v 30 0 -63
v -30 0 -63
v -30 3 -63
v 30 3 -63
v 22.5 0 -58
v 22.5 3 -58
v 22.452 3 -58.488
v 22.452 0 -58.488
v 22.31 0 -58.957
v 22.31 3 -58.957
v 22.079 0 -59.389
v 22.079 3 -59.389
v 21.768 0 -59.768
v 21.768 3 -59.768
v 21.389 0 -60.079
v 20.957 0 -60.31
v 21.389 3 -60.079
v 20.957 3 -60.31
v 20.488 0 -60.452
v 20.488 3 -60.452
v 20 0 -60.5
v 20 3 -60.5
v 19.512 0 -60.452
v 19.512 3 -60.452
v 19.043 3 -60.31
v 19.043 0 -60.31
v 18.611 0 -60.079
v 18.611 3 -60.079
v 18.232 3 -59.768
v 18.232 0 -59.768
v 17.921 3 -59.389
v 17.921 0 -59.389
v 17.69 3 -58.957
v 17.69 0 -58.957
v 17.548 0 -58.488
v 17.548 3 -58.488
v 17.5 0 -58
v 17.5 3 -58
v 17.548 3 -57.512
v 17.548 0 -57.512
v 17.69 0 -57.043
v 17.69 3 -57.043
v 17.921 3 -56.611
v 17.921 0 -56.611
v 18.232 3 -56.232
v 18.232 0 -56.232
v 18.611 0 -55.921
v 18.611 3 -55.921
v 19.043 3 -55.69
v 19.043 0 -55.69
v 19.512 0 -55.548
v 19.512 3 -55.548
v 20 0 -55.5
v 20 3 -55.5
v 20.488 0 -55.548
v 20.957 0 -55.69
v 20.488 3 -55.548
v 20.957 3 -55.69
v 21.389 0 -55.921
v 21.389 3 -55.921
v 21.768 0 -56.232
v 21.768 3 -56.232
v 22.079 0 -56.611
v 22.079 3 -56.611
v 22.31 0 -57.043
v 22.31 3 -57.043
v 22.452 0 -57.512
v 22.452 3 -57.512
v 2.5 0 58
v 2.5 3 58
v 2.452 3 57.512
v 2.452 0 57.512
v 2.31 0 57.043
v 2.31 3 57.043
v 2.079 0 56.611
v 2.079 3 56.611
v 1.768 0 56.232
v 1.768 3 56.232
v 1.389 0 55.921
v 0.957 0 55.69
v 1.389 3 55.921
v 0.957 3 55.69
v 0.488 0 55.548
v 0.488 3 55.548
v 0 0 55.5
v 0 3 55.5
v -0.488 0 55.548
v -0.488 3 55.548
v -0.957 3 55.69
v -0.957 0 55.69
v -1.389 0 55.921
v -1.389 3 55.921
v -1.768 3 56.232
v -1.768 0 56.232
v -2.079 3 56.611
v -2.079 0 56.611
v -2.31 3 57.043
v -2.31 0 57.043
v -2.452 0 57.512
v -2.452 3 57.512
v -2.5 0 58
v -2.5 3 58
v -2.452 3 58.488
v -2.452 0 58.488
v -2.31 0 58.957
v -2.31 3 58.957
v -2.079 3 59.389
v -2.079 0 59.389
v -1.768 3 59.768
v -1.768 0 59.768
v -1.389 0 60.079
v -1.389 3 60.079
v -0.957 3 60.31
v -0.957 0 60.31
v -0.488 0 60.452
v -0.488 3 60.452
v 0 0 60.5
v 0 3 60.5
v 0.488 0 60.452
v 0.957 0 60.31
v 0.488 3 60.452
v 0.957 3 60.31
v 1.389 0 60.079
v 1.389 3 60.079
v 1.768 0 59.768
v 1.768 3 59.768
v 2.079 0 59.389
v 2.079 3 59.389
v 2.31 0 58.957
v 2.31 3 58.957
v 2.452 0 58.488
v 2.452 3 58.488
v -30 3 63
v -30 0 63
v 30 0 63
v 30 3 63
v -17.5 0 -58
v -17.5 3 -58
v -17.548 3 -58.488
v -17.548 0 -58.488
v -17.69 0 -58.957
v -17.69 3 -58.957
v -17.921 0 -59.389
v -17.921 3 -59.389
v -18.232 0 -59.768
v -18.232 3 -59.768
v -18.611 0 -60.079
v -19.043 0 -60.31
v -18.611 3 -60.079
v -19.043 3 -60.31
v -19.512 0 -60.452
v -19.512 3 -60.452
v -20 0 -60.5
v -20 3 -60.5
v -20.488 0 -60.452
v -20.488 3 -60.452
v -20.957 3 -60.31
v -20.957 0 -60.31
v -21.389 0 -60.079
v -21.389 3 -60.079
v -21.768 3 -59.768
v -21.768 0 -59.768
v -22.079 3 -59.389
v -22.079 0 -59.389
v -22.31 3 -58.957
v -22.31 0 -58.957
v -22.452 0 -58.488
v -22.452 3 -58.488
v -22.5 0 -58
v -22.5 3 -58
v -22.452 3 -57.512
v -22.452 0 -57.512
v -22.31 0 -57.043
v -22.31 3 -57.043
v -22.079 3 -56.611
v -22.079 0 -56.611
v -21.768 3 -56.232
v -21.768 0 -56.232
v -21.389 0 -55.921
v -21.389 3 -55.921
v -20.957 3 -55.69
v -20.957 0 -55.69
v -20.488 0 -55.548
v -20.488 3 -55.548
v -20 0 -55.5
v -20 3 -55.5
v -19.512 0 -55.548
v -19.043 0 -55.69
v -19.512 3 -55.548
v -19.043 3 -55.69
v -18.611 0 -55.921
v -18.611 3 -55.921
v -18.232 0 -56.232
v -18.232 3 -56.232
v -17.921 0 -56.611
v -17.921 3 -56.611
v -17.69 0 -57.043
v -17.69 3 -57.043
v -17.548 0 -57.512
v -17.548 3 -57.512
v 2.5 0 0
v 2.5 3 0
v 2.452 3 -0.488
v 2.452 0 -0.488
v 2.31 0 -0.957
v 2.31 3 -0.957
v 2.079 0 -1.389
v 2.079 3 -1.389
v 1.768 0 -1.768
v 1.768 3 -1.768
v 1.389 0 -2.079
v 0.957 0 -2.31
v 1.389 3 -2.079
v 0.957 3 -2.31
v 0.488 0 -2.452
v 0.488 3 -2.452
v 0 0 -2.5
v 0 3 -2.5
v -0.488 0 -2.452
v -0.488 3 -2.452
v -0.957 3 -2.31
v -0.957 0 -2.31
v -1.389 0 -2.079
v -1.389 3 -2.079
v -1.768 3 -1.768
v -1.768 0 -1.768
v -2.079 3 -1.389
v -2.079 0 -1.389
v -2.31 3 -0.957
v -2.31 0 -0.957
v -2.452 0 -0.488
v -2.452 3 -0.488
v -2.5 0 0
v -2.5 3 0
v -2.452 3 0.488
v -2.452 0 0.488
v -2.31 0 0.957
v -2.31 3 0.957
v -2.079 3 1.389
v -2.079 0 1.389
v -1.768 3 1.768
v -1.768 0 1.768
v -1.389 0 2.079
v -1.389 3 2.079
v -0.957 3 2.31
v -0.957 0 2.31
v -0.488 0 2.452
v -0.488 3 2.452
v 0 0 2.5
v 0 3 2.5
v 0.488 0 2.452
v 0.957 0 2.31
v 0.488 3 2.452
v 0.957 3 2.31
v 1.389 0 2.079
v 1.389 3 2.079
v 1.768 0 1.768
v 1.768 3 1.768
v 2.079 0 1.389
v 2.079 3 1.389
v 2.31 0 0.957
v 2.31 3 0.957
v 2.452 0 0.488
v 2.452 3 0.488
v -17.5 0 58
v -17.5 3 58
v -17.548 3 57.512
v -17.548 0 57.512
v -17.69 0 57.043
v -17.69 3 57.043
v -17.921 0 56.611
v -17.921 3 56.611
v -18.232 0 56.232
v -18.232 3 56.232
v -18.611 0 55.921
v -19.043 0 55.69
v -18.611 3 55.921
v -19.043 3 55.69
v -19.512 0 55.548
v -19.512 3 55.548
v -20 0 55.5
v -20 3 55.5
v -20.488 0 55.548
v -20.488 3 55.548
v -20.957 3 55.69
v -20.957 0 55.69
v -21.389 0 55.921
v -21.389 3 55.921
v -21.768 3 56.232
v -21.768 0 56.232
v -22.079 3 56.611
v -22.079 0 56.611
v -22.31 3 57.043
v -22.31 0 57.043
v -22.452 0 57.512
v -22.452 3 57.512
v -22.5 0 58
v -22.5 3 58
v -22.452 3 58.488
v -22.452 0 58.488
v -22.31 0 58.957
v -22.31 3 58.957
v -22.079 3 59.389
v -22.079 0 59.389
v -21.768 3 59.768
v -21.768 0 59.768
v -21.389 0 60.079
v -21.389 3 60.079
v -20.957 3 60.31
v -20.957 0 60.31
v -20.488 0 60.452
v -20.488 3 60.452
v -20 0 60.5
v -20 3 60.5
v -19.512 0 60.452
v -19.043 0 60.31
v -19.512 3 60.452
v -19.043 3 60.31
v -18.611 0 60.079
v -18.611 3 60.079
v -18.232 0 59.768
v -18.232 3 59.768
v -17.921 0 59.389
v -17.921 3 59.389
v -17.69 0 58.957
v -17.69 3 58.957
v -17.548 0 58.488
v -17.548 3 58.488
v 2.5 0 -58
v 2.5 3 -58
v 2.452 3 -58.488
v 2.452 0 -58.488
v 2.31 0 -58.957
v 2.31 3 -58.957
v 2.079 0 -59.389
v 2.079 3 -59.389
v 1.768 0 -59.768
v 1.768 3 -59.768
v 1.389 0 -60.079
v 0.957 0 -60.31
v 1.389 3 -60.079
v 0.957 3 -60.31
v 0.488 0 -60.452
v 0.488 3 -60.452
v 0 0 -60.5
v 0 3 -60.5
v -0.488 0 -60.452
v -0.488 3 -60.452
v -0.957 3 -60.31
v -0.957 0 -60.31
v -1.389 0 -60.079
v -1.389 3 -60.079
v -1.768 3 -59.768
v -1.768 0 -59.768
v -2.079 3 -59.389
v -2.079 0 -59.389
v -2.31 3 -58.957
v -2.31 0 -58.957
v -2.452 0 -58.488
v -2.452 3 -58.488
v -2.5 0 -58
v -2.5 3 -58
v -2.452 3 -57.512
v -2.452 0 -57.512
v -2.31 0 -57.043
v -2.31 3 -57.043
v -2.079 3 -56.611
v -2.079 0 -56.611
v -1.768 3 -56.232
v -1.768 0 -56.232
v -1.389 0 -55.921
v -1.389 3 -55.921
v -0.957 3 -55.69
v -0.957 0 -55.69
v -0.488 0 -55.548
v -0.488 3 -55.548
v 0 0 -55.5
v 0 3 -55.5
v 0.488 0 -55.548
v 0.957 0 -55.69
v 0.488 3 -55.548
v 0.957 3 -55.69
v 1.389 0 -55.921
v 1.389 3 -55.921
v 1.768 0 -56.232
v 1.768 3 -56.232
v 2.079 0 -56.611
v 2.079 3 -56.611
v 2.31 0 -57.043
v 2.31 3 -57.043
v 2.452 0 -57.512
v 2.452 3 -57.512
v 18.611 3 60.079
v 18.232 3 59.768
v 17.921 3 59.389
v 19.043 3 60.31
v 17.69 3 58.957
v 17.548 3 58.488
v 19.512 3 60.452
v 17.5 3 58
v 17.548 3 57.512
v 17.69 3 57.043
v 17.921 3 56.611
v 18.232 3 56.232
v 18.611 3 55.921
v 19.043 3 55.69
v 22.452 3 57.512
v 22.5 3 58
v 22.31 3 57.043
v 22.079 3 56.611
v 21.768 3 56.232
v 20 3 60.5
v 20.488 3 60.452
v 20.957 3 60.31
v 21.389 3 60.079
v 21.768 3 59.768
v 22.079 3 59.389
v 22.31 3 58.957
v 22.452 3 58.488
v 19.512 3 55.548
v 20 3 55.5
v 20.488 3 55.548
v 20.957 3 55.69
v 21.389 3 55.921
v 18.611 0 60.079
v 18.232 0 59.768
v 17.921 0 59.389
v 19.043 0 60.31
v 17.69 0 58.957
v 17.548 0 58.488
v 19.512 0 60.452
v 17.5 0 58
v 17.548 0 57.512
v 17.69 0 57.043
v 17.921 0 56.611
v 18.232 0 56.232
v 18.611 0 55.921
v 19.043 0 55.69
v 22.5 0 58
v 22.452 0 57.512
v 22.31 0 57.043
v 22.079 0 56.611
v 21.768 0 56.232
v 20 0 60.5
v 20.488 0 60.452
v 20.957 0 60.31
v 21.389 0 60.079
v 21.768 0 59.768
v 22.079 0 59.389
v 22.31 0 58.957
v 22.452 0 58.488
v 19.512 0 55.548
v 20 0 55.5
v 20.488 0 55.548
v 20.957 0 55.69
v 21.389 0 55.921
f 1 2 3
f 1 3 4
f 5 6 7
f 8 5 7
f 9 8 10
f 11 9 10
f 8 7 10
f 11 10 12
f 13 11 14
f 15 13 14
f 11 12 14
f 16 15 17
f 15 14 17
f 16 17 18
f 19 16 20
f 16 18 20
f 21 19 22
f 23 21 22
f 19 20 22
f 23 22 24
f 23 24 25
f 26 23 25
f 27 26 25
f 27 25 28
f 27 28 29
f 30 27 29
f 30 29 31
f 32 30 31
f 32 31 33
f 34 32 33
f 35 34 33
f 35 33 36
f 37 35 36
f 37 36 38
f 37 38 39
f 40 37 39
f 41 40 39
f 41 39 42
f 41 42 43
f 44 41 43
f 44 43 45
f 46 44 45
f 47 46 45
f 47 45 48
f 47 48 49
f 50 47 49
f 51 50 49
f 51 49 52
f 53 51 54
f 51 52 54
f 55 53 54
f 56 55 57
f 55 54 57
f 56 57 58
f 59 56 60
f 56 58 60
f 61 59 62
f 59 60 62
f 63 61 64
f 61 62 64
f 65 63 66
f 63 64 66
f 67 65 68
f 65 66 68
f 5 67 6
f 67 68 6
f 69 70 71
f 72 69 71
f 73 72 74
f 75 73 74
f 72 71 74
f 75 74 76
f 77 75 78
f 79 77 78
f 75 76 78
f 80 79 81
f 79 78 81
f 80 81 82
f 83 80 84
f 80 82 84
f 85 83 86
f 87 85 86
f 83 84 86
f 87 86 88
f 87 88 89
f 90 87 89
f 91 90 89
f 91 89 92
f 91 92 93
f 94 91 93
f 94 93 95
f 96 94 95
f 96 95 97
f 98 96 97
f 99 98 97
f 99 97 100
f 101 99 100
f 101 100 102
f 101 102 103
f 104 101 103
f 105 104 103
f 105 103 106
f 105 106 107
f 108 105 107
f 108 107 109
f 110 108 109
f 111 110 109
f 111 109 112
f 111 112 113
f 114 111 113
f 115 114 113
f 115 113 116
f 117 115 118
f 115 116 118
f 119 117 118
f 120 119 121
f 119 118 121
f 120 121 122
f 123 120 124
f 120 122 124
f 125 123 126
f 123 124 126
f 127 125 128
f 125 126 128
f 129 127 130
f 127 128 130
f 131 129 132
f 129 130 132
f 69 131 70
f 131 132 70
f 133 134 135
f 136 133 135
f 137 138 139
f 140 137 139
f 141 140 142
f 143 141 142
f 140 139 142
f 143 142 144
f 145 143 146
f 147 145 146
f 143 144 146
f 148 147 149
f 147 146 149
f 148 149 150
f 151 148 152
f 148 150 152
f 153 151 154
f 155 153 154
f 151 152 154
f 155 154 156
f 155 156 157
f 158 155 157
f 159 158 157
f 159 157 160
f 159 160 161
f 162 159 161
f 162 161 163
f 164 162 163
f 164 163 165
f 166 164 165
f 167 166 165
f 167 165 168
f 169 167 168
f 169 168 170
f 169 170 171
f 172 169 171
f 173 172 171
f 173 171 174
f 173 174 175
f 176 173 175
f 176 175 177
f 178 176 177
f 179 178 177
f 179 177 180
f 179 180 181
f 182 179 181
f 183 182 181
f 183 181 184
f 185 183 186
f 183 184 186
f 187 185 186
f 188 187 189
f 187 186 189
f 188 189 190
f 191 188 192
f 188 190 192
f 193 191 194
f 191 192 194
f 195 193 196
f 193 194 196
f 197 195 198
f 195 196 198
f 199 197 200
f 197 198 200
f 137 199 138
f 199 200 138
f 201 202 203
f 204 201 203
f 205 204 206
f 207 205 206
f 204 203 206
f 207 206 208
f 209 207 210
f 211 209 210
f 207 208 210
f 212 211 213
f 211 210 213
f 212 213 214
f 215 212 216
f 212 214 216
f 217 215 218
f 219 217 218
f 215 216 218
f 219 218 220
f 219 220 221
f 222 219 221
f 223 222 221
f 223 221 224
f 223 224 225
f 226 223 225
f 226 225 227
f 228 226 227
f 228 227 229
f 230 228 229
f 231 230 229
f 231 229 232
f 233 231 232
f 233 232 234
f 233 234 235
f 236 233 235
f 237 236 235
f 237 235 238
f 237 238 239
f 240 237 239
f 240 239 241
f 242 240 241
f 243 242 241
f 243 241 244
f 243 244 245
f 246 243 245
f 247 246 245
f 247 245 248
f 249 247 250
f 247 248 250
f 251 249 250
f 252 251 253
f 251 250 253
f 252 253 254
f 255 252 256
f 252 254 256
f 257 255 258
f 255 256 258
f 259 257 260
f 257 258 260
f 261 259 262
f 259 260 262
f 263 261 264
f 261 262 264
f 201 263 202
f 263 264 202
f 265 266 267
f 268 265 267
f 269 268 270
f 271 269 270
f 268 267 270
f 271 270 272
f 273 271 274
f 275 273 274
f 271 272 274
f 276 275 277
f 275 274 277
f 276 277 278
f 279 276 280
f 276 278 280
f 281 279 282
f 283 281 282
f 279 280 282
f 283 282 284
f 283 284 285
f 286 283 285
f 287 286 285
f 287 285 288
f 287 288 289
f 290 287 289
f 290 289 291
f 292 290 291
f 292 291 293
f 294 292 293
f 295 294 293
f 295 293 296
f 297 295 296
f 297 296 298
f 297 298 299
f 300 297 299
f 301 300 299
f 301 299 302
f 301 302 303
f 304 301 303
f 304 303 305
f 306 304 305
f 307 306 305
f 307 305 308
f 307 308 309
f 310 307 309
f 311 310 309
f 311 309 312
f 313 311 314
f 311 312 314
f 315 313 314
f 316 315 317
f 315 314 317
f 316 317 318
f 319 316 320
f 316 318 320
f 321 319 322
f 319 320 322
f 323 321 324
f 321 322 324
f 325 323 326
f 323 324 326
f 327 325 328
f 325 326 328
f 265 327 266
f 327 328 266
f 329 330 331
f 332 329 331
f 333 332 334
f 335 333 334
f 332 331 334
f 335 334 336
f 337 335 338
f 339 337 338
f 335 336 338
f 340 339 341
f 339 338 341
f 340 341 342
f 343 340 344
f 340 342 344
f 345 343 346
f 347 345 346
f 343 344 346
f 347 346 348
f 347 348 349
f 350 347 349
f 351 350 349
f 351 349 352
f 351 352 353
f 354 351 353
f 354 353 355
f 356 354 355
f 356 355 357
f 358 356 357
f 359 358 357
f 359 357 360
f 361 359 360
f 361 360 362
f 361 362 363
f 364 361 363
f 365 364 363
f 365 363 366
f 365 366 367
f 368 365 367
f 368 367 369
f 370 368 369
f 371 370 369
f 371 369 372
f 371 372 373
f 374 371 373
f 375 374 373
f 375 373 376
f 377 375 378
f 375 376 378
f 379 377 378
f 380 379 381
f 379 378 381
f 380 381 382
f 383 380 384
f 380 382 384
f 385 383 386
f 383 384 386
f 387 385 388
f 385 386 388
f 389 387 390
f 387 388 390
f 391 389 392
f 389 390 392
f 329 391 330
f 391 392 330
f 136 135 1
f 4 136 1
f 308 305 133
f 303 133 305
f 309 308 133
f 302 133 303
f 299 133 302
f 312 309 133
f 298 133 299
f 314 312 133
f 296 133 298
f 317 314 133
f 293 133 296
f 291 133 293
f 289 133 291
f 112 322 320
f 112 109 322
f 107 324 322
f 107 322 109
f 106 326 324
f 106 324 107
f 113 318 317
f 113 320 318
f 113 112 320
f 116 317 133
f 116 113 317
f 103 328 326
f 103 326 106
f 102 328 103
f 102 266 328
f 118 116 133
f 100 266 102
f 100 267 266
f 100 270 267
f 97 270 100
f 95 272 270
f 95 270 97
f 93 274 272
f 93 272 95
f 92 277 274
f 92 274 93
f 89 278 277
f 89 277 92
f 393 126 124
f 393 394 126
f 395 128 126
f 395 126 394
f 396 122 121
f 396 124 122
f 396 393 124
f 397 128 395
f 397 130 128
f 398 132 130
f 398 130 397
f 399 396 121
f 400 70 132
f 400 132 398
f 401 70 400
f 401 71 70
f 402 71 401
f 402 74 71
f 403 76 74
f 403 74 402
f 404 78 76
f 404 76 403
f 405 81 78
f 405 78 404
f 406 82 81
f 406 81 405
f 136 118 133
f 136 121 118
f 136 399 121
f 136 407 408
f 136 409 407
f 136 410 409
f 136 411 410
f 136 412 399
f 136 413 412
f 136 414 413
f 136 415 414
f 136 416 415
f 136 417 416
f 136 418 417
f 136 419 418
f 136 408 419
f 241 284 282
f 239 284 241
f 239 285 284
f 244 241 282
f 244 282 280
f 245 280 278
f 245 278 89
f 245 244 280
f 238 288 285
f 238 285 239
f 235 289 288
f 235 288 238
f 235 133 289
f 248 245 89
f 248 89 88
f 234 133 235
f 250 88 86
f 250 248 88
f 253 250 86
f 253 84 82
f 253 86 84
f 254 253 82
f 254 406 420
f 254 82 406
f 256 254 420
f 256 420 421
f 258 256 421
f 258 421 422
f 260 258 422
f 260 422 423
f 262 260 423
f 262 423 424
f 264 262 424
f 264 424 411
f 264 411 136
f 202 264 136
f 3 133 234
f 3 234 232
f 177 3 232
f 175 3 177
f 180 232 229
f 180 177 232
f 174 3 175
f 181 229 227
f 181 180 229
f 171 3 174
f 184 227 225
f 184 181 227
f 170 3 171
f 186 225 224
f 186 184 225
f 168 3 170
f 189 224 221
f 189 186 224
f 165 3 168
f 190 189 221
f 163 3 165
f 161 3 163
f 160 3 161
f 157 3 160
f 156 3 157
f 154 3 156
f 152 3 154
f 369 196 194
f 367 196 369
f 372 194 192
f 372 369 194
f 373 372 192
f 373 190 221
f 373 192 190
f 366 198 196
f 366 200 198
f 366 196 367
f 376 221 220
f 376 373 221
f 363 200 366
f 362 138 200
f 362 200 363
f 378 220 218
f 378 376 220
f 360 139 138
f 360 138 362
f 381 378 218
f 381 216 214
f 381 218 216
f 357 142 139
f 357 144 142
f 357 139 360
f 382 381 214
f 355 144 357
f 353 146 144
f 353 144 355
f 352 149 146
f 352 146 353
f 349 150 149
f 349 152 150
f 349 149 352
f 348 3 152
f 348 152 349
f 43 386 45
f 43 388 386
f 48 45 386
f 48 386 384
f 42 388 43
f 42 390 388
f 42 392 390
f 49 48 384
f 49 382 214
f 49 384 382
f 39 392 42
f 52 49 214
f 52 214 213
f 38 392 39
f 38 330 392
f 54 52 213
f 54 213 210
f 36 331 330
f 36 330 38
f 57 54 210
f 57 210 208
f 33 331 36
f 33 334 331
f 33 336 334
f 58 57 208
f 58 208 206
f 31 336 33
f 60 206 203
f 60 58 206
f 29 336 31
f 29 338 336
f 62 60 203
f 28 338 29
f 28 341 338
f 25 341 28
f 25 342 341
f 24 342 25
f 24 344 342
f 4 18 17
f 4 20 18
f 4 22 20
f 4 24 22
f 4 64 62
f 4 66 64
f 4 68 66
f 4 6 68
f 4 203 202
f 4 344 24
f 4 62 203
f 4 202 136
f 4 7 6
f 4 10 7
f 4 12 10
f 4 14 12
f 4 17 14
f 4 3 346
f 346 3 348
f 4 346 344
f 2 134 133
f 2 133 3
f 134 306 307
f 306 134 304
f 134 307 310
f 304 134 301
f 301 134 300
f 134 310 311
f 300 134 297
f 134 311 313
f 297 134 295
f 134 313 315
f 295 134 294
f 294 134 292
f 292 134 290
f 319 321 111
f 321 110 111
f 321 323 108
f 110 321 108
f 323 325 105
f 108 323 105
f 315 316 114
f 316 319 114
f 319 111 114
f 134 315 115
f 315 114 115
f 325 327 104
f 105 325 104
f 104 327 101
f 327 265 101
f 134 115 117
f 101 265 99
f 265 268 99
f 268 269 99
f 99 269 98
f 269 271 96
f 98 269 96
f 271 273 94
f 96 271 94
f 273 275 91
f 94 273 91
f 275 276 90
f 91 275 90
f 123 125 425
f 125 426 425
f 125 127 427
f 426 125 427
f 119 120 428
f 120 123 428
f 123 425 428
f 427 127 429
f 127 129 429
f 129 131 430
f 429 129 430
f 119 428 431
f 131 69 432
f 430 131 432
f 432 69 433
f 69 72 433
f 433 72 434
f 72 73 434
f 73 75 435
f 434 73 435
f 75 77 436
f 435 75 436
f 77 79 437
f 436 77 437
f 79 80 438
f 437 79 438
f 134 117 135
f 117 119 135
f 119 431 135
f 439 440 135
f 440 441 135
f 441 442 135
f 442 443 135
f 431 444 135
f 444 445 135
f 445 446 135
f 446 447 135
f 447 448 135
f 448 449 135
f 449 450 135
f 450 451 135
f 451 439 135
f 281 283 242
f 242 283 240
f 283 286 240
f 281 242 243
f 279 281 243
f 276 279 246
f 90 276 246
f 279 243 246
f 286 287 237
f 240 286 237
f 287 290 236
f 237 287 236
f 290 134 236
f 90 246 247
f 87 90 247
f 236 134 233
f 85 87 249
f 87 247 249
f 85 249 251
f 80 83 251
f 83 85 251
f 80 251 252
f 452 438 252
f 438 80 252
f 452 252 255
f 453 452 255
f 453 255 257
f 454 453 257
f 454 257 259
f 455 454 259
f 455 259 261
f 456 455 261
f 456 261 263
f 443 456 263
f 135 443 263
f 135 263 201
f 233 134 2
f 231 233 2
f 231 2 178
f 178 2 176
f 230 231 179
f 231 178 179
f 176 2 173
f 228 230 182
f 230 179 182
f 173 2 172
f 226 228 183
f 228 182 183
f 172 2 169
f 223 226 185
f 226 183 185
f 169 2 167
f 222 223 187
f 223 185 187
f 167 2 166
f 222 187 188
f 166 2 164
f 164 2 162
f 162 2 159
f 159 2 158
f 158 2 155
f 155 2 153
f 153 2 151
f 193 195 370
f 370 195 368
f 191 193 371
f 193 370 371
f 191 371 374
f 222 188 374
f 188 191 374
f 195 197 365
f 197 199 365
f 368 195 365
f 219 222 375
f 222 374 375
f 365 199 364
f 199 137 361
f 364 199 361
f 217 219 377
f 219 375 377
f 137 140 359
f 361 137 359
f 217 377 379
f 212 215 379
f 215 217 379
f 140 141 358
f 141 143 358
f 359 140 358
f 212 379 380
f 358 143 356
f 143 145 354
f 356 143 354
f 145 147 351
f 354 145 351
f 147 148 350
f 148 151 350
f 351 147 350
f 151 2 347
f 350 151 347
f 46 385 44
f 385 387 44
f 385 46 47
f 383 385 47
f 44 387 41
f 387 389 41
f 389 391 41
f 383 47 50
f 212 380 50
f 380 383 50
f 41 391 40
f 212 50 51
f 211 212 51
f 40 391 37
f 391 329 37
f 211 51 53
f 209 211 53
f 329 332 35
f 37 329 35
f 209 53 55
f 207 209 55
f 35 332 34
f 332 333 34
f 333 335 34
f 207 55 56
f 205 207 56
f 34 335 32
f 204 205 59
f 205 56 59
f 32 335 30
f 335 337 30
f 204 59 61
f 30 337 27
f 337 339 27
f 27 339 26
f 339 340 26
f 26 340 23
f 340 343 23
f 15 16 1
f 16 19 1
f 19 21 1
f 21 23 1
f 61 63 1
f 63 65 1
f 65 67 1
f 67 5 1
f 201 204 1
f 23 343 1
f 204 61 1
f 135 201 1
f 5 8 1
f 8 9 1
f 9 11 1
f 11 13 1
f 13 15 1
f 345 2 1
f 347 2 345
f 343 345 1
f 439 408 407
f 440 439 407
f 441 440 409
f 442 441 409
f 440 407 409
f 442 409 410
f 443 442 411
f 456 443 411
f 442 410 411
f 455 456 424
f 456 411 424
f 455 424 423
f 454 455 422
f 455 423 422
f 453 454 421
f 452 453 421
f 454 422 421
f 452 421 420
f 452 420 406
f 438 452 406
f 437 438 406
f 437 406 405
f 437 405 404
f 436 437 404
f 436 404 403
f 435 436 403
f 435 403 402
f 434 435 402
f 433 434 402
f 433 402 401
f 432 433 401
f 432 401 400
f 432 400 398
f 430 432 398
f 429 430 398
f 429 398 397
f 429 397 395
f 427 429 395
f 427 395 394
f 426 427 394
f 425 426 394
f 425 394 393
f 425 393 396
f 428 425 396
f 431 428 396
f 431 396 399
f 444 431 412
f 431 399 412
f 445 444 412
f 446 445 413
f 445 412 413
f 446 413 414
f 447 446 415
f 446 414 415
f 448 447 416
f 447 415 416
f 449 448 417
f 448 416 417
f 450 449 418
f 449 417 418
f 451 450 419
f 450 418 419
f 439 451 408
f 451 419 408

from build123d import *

# Parameters (mm, degrees)
SKETCH1_W           = 60
SKETCH1_H           = 126
BOSS_EXTRUDE1_DEPTH = 3
SKETCH2_R           = 2.5
CUT_EXTRUDE1_DEPTH  = 5


with BuildPart() as part:
    # Sketch1 → Boss-Extrude1 (new body)
    with BuildSketch(Plane(origin=(0, 0, 0), x_dir=(1, 0, 0), z_dir=(0, 1, 0))):
        Rectangle(SKETCH1_W, SKETCH1_H)
    extrude(amount=BOSS_EXTRUDE1_DEPTH)

    # Sketch2 → Cut-Extrude1 (cut)
    with BuildSketch(Plane(origin=(0, 3, 0), x_dir=(1, 0, 0), z_dir=(0, 1, 0))):
        with Locations((0, -58)):
            Circle(SKETCH2_R)
        with Locations((20, -58)):
            Circle(SKETCH2_R)
        with Locations((-20, -58)):
            Circle(SKETCH2_R)
        with Locations((20, 58)):
            Circle(SKETCH2_R)
        with Locations((0, 58)):
            Circle(SKETCH2_R)
        with Locations((-20, 58)):
            Circle(SKETCH2_R)
        Circle(SKETCH2_R)
    extrude(amount=-CUT_EXTRUDE1_DEPTH, mode=Mode.SUBTRACT)


solid = part.part
